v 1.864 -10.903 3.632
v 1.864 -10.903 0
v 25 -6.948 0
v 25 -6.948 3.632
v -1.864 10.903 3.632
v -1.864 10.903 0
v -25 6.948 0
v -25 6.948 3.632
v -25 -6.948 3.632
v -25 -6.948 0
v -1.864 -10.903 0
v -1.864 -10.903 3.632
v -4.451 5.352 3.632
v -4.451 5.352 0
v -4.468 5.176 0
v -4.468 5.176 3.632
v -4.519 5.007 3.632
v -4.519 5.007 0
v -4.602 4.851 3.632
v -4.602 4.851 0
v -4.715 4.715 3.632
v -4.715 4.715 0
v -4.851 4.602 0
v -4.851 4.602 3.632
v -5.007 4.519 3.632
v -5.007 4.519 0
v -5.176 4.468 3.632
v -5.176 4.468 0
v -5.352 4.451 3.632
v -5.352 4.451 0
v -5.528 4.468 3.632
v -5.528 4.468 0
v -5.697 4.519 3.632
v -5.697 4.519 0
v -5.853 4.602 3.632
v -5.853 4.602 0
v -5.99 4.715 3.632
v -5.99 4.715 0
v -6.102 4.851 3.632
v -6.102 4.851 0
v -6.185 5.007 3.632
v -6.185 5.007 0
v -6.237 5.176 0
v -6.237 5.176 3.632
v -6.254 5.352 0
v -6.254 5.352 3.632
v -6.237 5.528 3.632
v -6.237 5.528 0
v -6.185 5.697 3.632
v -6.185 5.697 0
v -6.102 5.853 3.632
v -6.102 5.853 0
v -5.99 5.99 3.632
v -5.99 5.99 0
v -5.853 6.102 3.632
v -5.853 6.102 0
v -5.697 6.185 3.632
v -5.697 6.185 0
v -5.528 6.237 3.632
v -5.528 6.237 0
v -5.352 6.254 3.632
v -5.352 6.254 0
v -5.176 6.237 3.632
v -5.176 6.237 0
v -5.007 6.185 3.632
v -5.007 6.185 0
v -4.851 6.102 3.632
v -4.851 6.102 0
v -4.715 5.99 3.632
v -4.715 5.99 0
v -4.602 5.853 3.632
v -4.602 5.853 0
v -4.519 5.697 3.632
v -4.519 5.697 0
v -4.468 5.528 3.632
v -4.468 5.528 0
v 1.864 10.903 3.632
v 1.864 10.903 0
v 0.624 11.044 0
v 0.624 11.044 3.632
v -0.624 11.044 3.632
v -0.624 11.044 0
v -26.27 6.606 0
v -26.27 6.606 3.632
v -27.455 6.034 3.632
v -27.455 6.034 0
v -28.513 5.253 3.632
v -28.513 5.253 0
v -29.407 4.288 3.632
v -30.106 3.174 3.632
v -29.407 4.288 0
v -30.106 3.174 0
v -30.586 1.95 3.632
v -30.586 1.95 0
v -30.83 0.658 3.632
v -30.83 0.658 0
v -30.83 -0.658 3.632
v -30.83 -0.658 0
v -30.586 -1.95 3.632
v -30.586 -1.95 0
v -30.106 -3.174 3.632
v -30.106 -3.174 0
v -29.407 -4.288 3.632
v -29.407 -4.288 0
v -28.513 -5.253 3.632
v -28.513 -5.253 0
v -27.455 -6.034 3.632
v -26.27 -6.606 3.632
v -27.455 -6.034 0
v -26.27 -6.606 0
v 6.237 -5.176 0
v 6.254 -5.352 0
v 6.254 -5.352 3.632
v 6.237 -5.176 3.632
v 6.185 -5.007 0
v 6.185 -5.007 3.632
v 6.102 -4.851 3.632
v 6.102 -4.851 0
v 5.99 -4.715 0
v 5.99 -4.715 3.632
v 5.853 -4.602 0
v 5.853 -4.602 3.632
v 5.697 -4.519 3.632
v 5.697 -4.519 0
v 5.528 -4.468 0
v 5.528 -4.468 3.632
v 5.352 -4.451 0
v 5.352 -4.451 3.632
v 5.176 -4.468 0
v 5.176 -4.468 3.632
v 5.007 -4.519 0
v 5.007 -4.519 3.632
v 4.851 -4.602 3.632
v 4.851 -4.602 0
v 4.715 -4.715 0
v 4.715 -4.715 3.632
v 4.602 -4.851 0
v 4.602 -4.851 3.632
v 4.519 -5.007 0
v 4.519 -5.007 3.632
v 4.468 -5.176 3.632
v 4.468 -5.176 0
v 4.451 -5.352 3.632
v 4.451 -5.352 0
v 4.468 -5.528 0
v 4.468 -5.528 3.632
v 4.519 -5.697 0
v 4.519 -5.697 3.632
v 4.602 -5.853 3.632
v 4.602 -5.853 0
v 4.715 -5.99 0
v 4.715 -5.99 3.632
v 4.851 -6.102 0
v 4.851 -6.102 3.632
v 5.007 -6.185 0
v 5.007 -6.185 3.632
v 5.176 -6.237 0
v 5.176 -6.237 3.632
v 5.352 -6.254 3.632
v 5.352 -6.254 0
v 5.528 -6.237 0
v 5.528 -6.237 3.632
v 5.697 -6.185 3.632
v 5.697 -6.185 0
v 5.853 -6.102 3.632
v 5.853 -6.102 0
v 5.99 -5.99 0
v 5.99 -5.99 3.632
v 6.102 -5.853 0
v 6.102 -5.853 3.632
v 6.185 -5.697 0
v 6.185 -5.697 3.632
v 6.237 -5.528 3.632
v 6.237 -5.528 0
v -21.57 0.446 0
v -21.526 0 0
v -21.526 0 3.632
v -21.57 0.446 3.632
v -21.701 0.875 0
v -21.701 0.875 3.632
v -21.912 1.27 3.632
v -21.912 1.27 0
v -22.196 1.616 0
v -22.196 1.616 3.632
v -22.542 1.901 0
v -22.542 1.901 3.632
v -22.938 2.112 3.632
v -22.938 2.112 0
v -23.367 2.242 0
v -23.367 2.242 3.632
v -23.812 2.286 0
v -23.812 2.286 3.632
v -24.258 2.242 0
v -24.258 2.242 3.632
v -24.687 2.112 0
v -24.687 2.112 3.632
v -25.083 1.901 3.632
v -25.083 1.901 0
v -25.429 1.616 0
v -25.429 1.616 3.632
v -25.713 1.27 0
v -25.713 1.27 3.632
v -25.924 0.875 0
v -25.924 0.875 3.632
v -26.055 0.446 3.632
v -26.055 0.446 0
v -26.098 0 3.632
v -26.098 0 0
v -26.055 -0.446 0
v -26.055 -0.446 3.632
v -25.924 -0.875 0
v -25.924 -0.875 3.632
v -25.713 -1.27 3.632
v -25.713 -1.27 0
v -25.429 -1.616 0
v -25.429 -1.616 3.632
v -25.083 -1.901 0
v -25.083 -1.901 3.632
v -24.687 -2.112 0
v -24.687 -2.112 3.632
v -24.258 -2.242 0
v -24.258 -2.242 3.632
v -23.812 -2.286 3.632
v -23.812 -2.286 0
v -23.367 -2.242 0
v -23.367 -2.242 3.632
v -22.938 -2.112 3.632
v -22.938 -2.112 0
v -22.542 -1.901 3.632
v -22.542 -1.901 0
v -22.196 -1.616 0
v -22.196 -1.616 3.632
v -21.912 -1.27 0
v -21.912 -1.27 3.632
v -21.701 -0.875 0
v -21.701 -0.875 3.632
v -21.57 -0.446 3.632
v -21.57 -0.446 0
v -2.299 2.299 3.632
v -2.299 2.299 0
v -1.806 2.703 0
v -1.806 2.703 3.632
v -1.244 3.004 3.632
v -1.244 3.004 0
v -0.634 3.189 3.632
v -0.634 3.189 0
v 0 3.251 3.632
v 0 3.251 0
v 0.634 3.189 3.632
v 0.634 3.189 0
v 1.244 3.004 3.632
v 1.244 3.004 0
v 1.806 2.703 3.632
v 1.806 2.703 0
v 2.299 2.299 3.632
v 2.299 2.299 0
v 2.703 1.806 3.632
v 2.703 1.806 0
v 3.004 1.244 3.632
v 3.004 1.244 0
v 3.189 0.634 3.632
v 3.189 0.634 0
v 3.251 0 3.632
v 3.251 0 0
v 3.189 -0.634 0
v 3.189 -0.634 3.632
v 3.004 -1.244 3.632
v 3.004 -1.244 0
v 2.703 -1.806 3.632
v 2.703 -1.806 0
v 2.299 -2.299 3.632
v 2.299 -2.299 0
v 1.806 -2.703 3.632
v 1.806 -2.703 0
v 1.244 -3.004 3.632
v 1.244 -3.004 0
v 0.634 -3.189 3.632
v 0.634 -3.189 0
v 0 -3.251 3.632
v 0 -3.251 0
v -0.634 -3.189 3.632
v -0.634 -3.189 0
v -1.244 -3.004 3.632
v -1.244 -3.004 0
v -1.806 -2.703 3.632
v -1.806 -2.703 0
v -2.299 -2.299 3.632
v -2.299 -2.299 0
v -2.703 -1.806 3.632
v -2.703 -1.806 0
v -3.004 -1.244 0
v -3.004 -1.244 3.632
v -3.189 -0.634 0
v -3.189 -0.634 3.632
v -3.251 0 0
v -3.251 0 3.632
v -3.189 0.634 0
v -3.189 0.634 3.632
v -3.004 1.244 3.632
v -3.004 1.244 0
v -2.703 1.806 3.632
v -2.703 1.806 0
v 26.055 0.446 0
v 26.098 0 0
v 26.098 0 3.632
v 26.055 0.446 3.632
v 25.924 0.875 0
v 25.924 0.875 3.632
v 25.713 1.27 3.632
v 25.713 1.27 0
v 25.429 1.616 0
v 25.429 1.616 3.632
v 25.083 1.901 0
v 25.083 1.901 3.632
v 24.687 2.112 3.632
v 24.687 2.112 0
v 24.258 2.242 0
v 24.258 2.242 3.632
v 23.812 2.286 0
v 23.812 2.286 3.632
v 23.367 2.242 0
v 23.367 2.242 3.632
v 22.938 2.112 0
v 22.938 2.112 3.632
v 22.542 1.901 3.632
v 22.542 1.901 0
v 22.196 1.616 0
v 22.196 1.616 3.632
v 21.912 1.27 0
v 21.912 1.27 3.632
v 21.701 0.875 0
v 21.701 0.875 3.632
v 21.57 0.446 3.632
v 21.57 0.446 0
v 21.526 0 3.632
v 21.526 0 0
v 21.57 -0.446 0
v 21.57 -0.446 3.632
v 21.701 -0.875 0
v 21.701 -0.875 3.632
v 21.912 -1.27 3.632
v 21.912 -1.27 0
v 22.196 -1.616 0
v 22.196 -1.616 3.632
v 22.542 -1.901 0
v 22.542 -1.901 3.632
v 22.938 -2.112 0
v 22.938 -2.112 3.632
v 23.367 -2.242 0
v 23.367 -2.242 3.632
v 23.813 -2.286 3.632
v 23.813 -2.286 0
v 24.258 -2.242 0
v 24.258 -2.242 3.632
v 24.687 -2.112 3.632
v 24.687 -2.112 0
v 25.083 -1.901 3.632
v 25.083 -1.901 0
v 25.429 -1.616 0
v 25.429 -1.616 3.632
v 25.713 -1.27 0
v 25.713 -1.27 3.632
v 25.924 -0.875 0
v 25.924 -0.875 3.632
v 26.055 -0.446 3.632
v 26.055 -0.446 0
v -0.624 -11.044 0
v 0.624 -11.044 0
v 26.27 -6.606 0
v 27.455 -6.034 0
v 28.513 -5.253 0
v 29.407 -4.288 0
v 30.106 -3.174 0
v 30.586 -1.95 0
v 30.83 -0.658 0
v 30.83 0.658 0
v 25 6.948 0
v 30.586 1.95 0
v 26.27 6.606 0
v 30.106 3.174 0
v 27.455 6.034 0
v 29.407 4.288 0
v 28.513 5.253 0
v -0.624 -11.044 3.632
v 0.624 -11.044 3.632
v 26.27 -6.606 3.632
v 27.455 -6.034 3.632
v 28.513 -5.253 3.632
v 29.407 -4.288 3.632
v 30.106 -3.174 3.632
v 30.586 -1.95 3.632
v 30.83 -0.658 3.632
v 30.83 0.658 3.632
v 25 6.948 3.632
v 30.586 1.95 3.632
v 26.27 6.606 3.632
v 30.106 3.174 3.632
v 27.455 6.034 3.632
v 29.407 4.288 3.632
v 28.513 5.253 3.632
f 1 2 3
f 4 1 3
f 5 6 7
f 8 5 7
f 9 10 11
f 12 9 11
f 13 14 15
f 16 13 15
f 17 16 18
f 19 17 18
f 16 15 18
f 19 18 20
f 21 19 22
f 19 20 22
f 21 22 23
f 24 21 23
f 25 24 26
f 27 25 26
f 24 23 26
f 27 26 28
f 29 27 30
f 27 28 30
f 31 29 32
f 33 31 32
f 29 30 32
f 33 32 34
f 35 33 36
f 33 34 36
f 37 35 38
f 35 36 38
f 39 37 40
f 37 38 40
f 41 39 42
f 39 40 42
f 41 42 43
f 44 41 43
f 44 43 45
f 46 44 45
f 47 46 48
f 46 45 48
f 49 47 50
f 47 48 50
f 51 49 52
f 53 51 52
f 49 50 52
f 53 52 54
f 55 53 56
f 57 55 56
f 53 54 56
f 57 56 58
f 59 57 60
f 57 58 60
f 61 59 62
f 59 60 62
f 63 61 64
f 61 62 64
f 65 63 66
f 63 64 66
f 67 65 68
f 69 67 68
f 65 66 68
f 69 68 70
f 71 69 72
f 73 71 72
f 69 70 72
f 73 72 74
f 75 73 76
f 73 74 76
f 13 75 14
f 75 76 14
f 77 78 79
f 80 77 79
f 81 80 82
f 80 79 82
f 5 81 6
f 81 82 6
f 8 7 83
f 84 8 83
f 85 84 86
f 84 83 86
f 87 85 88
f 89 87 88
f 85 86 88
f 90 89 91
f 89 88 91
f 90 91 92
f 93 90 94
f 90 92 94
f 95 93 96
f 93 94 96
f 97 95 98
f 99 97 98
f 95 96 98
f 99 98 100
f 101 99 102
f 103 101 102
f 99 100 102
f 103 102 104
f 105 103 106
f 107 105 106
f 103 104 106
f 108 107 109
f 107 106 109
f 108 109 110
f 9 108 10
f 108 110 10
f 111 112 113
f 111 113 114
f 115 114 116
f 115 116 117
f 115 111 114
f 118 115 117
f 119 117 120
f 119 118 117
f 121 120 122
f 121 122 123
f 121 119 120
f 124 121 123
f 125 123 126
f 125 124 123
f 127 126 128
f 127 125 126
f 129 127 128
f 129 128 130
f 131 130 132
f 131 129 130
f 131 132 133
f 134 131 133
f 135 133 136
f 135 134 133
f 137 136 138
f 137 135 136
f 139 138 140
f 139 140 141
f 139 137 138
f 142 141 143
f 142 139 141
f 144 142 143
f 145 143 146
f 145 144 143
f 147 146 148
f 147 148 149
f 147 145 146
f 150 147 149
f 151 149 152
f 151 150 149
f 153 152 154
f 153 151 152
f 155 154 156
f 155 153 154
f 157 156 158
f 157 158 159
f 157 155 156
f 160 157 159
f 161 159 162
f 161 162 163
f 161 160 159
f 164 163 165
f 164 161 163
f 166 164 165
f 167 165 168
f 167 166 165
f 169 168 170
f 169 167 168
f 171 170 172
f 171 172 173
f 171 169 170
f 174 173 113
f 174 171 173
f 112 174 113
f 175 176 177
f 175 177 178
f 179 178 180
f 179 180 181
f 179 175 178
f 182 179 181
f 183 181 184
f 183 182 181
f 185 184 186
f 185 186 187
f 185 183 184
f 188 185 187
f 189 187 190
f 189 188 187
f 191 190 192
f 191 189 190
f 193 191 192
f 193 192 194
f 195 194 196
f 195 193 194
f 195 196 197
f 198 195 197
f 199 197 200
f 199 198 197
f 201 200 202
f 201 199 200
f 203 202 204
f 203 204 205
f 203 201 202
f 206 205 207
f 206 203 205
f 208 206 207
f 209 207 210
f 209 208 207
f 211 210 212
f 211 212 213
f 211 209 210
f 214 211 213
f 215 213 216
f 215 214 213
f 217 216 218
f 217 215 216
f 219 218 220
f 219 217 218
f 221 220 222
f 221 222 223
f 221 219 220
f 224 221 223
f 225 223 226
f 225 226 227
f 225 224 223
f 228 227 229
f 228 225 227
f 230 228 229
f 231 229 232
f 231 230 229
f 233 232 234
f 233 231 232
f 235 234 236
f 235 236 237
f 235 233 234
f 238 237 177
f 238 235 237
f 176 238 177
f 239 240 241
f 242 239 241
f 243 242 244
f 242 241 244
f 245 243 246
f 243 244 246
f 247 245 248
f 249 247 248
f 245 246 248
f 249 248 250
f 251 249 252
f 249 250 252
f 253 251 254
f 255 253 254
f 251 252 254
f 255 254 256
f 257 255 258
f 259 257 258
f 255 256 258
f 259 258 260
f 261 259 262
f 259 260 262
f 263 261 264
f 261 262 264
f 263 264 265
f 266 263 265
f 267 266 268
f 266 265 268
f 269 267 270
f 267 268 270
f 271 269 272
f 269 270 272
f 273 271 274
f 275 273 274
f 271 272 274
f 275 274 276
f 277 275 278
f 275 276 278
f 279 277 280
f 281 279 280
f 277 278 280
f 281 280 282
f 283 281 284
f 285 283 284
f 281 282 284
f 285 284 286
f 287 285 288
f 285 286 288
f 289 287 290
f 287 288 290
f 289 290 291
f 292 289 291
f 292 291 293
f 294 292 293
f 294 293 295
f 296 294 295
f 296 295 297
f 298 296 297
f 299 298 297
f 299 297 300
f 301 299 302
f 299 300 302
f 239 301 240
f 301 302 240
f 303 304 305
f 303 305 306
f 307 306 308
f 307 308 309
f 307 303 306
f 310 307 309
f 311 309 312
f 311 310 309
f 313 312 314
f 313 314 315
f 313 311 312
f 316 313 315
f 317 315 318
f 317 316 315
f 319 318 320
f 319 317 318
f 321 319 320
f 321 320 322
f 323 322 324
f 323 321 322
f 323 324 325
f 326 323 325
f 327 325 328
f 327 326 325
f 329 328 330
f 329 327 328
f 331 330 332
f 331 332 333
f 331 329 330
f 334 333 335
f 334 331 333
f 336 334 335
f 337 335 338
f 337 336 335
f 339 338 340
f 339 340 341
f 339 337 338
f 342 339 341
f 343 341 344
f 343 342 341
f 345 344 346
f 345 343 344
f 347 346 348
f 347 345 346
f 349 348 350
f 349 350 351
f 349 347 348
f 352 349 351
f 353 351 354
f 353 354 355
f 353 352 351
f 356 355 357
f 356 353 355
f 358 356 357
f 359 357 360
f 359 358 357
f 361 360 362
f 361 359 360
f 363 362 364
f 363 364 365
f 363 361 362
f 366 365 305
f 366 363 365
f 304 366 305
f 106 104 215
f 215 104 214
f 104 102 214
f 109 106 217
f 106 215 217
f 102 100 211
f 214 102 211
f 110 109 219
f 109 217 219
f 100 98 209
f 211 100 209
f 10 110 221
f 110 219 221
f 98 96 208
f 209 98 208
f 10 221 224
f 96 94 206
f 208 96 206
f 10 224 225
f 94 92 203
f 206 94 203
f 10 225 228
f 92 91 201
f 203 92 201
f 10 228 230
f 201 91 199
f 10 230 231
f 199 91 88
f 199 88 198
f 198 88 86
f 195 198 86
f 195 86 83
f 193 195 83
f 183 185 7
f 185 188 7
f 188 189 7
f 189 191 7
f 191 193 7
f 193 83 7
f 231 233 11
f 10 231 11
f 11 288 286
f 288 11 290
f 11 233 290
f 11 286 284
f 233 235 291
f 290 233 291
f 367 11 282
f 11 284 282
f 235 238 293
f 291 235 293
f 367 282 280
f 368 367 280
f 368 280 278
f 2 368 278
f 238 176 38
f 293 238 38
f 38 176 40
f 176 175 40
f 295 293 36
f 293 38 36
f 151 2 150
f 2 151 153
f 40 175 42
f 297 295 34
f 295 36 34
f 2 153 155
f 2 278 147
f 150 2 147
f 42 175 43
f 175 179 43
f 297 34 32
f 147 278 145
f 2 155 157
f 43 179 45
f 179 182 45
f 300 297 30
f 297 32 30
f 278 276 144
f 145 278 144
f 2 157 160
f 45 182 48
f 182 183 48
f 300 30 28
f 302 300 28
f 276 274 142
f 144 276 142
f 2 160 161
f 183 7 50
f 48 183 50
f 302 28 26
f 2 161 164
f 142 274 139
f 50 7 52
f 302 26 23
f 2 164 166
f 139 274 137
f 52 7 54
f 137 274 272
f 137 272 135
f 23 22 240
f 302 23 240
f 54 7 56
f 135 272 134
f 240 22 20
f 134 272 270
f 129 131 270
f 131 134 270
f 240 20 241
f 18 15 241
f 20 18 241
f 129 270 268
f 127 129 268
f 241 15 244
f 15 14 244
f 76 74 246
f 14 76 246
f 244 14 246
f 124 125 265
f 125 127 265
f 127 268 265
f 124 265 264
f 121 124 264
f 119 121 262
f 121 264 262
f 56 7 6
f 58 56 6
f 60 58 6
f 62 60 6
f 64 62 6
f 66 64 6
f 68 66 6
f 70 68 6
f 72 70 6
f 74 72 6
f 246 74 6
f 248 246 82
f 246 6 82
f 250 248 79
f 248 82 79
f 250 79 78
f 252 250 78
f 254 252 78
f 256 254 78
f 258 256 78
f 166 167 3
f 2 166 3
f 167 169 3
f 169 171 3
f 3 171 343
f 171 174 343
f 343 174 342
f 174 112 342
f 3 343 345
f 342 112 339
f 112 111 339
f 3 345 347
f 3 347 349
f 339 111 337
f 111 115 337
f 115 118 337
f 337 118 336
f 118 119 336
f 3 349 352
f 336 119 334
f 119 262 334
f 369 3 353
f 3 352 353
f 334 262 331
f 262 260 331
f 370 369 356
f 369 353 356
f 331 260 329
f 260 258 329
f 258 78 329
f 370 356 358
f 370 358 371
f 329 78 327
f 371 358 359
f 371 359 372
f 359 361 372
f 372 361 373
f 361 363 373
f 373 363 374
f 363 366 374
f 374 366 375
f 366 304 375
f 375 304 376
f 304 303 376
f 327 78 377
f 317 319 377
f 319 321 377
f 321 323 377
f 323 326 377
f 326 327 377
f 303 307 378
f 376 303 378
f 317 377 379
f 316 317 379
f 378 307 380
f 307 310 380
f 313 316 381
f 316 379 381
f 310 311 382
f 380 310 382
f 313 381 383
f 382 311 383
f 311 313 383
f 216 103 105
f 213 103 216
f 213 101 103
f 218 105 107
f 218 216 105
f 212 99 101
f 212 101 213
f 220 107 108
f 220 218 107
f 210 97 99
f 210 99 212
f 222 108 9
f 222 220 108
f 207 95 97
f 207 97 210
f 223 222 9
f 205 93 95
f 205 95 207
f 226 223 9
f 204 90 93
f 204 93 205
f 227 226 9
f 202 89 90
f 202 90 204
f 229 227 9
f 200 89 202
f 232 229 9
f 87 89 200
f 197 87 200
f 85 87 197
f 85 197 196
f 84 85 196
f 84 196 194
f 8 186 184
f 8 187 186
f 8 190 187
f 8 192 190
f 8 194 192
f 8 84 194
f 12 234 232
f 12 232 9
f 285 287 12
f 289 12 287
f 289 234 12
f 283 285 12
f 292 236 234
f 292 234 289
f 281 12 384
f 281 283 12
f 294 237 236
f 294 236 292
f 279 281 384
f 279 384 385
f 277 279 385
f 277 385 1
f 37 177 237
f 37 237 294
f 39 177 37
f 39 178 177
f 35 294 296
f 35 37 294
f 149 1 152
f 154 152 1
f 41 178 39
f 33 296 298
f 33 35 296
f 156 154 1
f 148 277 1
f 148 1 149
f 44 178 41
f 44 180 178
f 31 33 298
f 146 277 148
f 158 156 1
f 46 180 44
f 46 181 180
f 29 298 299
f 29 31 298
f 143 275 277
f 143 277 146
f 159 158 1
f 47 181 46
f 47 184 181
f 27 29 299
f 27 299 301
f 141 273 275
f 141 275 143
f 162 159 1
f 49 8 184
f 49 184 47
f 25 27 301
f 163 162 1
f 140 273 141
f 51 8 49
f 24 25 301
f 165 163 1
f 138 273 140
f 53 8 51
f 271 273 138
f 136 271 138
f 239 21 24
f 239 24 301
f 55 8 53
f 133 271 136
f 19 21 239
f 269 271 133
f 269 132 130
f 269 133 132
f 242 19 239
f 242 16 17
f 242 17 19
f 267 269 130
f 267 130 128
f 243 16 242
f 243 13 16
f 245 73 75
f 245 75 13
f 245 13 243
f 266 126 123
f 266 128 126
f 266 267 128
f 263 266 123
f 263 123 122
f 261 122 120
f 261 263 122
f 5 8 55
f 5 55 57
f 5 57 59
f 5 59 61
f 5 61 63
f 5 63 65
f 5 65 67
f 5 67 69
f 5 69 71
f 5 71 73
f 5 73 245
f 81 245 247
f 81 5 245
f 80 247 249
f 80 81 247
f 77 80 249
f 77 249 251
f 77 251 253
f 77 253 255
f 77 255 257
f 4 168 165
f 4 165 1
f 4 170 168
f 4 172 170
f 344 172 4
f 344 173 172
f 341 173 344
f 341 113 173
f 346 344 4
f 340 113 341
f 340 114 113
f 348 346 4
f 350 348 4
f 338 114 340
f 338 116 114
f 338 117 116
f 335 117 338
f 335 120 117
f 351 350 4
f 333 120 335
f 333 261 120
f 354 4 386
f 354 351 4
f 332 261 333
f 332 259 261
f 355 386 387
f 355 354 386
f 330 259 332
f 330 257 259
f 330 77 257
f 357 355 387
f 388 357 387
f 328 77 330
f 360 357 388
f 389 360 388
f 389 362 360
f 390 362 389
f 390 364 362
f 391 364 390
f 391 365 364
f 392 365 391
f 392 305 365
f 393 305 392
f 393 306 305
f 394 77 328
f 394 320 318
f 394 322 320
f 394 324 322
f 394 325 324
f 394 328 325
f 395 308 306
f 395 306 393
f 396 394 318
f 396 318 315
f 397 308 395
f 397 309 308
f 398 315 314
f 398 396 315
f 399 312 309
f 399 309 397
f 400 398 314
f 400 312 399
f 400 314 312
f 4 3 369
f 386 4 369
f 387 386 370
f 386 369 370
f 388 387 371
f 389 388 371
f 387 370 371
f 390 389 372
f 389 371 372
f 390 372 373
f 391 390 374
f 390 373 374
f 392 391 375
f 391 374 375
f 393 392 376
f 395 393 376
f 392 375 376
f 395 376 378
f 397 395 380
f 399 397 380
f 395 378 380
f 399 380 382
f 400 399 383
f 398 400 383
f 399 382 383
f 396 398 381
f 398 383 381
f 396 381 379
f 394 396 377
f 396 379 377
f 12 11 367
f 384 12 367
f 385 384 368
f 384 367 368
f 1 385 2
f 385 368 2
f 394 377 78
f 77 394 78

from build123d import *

# Parameters (mm, degrees)
F0_R     = 0.9017
F0_R_2   = 2.286
F1_DEPTH = 3.6322


with BuildPart() as f1:
    # F0 (on Top) → F1 (new body)
    with BuildSketch(Plane.XY):
        with BuildLine():
            Line((25.000407, 6.947678), (1.864265, 10.903473))
            ThreePointArc((1.864265, 10.903473), (0, 11.0617), (-1.864265, 10.903473))
            Line((-1.864265, 10.903473), (-25.000407, 6.947678))
            ThreePointArc((-25.000407, 6.947678), (-30.861, 0), (-25.000407, -6.947678))
            Line((-25.000407, -6.947678), (-1.864265, -10.903473))
            ThreePointArc((-1.864265, -10.903473), (0, -11.0617), (1.864265, -10.903473))
            Line((1.864265, -10.903473), (25.000407, -6.947678))
            ThreePointArc((25.000407, -6.947678), (30.861, 0), (25.000407, 6.947678))
        make_face()
        with Locations((5.352233, -5.352233)):
            Circle(F0_R, mode=Mode.SUBTRACT)
        with Locations((-23.8125, 0)):
            Circle(F0_R_2, mode=Mode.SUBTRACT)
        with BuildLine():
            ThreePointArc((-4.450533, 5.352233), (-4.51917, 5.007167), (-4.714634, 4.714634))
            ThreePointArc((-4.714634, 4.714634), (-6.185295, 5.697298), (-4.450533, 5.352233))
        make_face(mode=Mode.SUBTRACT)
        with BuildLine():
            ThreePointArc((-2.298946, 2.298946), (1.24418, 3.003717), (3.2512, 0))
            ThreePointArc((3.2512, 0), (-1.24418, -3.003717), (-2.298946, 2.298946))
        make_face(mode=Mode.SUBTRACT)
        with Locations((23.8125, 0)):
            Circle(F0_R_2, mode=Mode.SUBTRACT)
    extrude(amount=F1_DEPTH)


solid = f1.part
